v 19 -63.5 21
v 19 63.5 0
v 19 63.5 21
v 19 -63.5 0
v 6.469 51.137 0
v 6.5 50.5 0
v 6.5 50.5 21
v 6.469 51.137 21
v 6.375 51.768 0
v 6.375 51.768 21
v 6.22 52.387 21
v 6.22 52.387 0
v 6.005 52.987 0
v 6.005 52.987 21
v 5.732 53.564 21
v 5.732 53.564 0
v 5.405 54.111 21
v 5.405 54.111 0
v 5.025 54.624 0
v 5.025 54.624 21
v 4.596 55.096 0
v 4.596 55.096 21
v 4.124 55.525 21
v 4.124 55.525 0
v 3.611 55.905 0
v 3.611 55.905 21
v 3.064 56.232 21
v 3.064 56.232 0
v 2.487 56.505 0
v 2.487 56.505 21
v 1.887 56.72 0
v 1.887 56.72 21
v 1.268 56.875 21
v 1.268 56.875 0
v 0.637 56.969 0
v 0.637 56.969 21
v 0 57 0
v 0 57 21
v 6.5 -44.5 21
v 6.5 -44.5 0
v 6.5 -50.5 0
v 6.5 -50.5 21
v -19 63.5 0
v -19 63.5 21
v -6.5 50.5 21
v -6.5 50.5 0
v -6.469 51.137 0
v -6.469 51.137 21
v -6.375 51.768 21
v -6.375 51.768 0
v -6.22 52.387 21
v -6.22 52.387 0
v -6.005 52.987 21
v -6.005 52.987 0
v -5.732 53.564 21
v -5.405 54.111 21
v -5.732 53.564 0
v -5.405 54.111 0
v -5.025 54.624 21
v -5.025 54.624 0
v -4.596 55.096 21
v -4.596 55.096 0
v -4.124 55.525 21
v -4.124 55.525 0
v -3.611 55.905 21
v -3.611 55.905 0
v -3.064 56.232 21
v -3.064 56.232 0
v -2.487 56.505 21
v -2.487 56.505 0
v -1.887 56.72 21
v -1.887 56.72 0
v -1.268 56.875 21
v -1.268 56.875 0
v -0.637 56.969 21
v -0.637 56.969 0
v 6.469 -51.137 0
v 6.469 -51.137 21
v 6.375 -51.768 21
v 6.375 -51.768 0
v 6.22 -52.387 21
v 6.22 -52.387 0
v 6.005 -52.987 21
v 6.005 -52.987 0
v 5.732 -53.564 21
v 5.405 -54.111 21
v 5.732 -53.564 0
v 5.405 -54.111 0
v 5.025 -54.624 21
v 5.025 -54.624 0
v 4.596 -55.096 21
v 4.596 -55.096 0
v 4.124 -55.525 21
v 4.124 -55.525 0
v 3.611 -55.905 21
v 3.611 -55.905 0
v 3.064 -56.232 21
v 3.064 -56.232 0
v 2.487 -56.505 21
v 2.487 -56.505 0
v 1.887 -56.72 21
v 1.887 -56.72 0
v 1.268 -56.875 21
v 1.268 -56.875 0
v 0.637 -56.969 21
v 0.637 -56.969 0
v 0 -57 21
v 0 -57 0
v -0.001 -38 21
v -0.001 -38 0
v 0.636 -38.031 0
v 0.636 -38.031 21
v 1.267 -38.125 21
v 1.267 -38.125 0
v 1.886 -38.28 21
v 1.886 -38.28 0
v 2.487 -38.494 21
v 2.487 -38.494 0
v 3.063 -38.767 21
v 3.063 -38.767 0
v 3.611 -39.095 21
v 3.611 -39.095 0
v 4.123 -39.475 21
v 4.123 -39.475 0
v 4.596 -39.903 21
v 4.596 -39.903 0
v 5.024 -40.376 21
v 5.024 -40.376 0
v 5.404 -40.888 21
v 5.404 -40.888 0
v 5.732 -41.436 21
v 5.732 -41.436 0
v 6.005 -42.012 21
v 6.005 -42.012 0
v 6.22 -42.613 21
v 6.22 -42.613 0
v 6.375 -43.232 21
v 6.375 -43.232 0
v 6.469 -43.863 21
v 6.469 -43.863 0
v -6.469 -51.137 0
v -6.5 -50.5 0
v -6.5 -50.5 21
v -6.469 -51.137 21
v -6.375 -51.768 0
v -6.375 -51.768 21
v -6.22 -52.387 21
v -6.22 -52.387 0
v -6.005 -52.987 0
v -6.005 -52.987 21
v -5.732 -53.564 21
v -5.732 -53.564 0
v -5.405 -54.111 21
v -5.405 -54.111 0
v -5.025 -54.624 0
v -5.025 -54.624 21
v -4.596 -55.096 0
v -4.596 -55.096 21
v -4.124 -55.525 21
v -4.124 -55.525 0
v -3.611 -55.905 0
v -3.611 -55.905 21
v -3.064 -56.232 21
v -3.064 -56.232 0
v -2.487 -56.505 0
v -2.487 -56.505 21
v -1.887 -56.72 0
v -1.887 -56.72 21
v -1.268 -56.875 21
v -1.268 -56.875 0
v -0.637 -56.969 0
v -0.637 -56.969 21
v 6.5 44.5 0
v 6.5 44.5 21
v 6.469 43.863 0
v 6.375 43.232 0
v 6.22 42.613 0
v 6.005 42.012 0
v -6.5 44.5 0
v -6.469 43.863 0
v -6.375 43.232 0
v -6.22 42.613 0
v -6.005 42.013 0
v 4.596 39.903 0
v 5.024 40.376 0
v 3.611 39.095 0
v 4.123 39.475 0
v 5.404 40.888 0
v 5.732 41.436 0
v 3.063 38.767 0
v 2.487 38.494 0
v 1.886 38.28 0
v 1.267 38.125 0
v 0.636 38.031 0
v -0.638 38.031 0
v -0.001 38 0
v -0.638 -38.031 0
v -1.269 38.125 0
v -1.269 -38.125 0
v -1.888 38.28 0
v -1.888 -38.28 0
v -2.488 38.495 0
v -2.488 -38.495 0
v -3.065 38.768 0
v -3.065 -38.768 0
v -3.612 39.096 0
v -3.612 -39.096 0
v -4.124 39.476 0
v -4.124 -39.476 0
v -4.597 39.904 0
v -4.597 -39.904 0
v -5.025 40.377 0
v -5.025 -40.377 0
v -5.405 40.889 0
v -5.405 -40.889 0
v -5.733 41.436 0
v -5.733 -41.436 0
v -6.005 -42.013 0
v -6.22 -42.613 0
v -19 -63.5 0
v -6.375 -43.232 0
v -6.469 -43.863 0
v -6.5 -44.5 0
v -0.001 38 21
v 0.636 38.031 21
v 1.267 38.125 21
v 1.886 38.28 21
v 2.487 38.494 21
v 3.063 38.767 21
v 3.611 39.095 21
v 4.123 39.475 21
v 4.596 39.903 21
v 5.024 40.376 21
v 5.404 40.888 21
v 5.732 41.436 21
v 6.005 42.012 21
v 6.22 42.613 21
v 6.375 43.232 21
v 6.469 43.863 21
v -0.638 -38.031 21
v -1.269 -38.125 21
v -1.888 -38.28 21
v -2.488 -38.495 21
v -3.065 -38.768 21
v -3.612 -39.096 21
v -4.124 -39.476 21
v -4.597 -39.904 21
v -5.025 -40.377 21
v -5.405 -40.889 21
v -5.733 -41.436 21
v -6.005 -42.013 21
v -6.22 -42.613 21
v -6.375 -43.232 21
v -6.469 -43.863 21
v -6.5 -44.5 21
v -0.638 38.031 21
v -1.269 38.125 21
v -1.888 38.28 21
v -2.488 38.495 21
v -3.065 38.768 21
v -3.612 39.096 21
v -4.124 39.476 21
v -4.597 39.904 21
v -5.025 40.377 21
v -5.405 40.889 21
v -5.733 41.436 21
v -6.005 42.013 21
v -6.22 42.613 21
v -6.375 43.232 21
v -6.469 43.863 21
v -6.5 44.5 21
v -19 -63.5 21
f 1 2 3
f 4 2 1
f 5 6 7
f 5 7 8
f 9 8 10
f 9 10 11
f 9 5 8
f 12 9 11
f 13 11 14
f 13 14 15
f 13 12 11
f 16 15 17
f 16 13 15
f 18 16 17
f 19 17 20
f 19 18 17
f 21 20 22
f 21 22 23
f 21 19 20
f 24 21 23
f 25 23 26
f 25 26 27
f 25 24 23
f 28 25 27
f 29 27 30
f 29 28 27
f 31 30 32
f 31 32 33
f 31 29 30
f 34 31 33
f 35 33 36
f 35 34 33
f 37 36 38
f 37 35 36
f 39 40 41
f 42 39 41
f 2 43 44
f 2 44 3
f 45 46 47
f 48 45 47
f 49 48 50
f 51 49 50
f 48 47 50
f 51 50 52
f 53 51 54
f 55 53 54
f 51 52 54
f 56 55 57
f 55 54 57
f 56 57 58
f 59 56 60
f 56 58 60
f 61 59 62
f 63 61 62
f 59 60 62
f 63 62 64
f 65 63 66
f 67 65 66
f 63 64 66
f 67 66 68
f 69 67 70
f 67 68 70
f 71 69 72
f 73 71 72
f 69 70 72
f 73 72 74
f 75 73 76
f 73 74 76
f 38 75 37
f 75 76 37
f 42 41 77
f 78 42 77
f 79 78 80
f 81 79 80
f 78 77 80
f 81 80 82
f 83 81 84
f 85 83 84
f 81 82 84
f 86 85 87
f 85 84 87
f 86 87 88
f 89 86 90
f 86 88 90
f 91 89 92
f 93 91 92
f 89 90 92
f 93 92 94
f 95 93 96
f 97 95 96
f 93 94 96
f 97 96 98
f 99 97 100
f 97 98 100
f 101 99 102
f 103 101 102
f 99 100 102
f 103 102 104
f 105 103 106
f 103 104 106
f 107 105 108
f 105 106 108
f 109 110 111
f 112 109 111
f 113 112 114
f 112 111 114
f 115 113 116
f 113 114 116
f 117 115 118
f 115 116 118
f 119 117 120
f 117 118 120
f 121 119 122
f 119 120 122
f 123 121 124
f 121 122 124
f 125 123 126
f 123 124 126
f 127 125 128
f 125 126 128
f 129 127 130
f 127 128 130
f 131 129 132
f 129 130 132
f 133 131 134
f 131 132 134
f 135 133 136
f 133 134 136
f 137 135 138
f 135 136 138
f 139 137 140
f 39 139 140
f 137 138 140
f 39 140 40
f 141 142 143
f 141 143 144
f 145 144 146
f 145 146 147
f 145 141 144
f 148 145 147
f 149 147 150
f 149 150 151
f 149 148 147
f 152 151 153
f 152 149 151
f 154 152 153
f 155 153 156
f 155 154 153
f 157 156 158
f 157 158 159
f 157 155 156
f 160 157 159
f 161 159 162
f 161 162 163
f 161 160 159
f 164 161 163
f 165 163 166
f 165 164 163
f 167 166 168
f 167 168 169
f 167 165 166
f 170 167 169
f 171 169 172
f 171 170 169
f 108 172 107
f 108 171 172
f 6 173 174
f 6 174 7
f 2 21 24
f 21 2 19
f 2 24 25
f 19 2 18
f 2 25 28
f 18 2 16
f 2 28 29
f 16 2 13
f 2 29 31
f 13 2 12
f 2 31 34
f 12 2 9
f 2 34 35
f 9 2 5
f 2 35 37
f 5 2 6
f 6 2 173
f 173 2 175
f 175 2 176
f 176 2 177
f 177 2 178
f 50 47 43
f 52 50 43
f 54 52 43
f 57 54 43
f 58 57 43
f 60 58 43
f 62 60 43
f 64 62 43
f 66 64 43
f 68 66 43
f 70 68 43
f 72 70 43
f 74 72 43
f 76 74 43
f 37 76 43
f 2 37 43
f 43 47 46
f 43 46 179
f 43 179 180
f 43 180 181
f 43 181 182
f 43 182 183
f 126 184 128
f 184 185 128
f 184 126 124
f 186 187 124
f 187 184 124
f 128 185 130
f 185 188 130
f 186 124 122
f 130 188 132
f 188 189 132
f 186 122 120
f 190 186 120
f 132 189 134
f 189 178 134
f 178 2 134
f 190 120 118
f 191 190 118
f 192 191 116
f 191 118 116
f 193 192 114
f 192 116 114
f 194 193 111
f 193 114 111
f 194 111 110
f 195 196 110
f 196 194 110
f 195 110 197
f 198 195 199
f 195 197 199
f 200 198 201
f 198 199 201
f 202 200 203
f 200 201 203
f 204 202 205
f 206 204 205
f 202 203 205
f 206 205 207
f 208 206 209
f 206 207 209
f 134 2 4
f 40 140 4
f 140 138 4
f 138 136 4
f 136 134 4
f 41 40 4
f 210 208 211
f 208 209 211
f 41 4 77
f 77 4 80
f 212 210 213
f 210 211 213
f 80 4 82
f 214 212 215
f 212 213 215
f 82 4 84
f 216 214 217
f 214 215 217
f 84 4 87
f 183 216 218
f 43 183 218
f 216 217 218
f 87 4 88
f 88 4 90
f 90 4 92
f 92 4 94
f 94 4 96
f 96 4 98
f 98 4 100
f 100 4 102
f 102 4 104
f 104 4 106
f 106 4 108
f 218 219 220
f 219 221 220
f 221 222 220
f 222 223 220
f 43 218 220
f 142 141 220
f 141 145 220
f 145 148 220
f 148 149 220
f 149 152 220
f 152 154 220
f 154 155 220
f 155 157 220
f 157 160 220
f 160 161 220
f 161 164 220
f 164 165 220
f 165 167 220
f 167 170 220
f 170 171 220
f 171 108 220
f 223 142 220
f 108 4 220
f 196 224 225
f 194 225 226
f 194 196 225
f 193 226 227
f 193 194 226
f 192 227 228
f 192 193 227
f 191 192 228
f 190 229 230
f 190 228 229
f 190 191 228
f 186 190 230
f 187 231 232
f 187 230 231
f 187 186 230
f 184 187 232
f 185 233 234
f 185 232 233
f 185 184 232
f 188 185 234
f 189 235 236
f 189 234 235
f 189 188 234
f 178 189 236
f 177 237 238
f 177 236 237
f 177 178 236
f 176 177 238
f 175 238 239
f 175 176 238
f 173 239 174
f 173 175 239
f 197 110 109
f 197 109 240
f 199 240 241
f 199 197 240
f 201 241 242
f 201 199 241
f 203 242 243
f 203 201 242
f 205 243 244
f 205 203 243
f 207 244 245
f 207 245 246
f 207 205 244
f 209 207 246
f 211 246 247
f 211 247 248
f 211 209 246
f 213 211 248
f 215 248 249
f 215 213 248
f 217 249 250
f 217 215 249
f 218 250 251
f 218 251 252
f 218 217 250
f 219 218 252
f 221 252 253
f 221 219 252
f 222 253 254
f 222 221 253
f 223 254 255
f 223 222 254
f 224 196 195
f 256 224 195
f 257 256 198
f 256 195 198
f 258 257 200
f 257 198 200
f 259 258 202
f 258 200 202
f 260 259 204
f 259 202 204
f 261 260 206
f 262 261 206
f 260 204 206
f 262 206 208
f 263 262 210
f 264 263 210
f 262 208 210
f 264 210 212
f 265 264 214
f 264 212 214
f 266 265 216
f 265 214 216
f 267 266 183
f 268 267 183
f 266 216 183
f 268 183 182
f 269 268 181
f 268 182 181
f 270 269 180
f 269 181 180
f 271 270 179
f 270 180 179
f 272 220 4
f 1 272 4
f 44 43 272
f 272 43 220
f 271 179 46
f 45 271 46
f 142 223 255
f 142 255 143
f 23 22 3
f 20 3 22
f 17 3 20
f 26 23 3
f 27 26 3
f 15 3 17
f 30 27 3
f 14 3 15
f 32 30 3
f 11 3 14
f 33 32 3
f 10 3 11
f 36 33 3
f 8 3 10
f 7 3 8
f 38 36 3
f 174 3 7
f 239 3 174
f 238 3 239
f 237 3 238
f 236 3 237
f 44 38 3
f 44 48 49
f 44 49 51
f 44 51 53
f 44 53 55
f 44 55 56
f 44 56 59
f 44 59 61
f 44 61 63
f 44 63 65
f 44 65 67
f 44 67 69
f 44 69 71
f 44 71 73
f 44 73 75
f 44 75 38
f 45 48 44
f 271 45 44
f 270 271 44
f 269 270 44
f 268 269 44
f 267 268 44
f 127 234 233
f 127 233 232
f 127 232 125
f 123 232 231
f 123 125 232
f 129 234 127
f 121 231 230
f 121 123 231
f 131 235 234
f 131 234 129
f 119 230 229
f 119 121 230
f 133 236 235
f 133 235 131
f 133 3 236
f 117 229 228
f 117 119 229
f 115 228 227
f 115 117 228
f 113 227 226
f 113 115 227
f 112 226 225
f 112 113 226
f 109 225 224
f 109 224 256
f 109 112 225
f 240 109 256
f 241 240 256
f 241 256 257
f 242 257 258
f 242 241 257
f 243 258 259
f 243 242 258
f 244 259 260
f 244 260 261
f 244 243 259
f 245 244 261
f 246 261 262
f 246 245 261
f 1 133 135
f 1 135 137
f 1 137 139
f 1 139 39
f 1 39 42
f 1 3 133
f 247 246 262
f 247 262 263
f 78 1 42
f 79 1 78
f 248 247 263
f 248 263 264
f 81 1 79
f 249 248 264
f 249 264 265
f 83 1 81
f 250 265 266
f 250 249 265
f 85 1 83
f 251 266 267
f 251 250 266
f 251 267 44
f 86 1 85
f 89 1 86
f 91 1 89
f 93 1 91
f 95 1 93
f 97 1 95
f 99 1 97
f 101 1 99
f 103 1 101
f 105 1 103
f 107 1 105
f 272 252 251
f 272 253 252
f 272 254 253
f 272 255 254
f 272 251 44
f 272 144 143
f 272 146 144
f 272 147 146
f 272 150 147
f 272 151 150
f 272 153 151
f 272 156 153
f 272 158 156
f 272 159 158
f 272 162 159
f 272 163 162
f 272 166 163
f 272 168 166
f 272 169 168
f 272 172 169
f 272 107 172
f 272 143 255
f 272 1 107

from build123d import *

# Parameters (mm, degrees)
PAD006_DEPTH               = 21
PAD006_MIRRORED002_2_DEPTH = 21


with BuildPart() as part:
    # Sketch006 → Pad006 (new body)
    with BuildSketch(Plane.XY):
        with BuildLine():
            Line((0, 0), (19, 0))
            Line((19, 0), (19, 63.5))
            Line((19, 63.5), (0, 63.5))
            Line((0, 63.5), (0, 57))
            ThreePointArc((6.5, 50.5), (4.596194, 55.096194), (0, 57))
            Line((6.5, 44.5), (6.5, 50.5))
            ThreePointArc((-0.001235, 38), (4.595757, 39.903369), (6.5, 44.5))
            Line((-0.001235, 38), (0, 0))
        make_face()
    pad006 = extrude(amount=PAD006_DEPTH)

    # Sketch006 Mirrored002 2 → Pad006 Mirrored002 2 (add)
    with BuildSketch(Plane(origin=(0, 0, 0), x_dir=(-1, 0, 0), z_dir=(0, 0, -1))):
        with BuildLine():
            Line((0, 0), (19, 0))
            Line((19, 0), (19, 63.5))
            Line((19, 63.5), (0, 63.5))
            Line((0, 63.5), (0, 57))
            ThreePointArc((6.5, 50.5), (4.596194, 55.096194), (0, 57))
            Line((6.5, 44.5), (6.5, 50.5))
            ThreePointArc((-0.001235, 38), (4.595757, 39.903369), (6.5, 44.5))
            Line((-0.001235, 38), (0, 0))
        make_face()
    pad006_mirrored002_2 = extrude(amount=-PAD006_MIRRORED002_2_DEPTH)

    # Mirrored003: Pad006, Pad006 Mirrored002 2 across Sketch006 H_Axis
    add(pad006.mirror(Plane.ZX))
    add(pad006_mirrored002_2.mirror(Plane.ZX))


solid = part.part
